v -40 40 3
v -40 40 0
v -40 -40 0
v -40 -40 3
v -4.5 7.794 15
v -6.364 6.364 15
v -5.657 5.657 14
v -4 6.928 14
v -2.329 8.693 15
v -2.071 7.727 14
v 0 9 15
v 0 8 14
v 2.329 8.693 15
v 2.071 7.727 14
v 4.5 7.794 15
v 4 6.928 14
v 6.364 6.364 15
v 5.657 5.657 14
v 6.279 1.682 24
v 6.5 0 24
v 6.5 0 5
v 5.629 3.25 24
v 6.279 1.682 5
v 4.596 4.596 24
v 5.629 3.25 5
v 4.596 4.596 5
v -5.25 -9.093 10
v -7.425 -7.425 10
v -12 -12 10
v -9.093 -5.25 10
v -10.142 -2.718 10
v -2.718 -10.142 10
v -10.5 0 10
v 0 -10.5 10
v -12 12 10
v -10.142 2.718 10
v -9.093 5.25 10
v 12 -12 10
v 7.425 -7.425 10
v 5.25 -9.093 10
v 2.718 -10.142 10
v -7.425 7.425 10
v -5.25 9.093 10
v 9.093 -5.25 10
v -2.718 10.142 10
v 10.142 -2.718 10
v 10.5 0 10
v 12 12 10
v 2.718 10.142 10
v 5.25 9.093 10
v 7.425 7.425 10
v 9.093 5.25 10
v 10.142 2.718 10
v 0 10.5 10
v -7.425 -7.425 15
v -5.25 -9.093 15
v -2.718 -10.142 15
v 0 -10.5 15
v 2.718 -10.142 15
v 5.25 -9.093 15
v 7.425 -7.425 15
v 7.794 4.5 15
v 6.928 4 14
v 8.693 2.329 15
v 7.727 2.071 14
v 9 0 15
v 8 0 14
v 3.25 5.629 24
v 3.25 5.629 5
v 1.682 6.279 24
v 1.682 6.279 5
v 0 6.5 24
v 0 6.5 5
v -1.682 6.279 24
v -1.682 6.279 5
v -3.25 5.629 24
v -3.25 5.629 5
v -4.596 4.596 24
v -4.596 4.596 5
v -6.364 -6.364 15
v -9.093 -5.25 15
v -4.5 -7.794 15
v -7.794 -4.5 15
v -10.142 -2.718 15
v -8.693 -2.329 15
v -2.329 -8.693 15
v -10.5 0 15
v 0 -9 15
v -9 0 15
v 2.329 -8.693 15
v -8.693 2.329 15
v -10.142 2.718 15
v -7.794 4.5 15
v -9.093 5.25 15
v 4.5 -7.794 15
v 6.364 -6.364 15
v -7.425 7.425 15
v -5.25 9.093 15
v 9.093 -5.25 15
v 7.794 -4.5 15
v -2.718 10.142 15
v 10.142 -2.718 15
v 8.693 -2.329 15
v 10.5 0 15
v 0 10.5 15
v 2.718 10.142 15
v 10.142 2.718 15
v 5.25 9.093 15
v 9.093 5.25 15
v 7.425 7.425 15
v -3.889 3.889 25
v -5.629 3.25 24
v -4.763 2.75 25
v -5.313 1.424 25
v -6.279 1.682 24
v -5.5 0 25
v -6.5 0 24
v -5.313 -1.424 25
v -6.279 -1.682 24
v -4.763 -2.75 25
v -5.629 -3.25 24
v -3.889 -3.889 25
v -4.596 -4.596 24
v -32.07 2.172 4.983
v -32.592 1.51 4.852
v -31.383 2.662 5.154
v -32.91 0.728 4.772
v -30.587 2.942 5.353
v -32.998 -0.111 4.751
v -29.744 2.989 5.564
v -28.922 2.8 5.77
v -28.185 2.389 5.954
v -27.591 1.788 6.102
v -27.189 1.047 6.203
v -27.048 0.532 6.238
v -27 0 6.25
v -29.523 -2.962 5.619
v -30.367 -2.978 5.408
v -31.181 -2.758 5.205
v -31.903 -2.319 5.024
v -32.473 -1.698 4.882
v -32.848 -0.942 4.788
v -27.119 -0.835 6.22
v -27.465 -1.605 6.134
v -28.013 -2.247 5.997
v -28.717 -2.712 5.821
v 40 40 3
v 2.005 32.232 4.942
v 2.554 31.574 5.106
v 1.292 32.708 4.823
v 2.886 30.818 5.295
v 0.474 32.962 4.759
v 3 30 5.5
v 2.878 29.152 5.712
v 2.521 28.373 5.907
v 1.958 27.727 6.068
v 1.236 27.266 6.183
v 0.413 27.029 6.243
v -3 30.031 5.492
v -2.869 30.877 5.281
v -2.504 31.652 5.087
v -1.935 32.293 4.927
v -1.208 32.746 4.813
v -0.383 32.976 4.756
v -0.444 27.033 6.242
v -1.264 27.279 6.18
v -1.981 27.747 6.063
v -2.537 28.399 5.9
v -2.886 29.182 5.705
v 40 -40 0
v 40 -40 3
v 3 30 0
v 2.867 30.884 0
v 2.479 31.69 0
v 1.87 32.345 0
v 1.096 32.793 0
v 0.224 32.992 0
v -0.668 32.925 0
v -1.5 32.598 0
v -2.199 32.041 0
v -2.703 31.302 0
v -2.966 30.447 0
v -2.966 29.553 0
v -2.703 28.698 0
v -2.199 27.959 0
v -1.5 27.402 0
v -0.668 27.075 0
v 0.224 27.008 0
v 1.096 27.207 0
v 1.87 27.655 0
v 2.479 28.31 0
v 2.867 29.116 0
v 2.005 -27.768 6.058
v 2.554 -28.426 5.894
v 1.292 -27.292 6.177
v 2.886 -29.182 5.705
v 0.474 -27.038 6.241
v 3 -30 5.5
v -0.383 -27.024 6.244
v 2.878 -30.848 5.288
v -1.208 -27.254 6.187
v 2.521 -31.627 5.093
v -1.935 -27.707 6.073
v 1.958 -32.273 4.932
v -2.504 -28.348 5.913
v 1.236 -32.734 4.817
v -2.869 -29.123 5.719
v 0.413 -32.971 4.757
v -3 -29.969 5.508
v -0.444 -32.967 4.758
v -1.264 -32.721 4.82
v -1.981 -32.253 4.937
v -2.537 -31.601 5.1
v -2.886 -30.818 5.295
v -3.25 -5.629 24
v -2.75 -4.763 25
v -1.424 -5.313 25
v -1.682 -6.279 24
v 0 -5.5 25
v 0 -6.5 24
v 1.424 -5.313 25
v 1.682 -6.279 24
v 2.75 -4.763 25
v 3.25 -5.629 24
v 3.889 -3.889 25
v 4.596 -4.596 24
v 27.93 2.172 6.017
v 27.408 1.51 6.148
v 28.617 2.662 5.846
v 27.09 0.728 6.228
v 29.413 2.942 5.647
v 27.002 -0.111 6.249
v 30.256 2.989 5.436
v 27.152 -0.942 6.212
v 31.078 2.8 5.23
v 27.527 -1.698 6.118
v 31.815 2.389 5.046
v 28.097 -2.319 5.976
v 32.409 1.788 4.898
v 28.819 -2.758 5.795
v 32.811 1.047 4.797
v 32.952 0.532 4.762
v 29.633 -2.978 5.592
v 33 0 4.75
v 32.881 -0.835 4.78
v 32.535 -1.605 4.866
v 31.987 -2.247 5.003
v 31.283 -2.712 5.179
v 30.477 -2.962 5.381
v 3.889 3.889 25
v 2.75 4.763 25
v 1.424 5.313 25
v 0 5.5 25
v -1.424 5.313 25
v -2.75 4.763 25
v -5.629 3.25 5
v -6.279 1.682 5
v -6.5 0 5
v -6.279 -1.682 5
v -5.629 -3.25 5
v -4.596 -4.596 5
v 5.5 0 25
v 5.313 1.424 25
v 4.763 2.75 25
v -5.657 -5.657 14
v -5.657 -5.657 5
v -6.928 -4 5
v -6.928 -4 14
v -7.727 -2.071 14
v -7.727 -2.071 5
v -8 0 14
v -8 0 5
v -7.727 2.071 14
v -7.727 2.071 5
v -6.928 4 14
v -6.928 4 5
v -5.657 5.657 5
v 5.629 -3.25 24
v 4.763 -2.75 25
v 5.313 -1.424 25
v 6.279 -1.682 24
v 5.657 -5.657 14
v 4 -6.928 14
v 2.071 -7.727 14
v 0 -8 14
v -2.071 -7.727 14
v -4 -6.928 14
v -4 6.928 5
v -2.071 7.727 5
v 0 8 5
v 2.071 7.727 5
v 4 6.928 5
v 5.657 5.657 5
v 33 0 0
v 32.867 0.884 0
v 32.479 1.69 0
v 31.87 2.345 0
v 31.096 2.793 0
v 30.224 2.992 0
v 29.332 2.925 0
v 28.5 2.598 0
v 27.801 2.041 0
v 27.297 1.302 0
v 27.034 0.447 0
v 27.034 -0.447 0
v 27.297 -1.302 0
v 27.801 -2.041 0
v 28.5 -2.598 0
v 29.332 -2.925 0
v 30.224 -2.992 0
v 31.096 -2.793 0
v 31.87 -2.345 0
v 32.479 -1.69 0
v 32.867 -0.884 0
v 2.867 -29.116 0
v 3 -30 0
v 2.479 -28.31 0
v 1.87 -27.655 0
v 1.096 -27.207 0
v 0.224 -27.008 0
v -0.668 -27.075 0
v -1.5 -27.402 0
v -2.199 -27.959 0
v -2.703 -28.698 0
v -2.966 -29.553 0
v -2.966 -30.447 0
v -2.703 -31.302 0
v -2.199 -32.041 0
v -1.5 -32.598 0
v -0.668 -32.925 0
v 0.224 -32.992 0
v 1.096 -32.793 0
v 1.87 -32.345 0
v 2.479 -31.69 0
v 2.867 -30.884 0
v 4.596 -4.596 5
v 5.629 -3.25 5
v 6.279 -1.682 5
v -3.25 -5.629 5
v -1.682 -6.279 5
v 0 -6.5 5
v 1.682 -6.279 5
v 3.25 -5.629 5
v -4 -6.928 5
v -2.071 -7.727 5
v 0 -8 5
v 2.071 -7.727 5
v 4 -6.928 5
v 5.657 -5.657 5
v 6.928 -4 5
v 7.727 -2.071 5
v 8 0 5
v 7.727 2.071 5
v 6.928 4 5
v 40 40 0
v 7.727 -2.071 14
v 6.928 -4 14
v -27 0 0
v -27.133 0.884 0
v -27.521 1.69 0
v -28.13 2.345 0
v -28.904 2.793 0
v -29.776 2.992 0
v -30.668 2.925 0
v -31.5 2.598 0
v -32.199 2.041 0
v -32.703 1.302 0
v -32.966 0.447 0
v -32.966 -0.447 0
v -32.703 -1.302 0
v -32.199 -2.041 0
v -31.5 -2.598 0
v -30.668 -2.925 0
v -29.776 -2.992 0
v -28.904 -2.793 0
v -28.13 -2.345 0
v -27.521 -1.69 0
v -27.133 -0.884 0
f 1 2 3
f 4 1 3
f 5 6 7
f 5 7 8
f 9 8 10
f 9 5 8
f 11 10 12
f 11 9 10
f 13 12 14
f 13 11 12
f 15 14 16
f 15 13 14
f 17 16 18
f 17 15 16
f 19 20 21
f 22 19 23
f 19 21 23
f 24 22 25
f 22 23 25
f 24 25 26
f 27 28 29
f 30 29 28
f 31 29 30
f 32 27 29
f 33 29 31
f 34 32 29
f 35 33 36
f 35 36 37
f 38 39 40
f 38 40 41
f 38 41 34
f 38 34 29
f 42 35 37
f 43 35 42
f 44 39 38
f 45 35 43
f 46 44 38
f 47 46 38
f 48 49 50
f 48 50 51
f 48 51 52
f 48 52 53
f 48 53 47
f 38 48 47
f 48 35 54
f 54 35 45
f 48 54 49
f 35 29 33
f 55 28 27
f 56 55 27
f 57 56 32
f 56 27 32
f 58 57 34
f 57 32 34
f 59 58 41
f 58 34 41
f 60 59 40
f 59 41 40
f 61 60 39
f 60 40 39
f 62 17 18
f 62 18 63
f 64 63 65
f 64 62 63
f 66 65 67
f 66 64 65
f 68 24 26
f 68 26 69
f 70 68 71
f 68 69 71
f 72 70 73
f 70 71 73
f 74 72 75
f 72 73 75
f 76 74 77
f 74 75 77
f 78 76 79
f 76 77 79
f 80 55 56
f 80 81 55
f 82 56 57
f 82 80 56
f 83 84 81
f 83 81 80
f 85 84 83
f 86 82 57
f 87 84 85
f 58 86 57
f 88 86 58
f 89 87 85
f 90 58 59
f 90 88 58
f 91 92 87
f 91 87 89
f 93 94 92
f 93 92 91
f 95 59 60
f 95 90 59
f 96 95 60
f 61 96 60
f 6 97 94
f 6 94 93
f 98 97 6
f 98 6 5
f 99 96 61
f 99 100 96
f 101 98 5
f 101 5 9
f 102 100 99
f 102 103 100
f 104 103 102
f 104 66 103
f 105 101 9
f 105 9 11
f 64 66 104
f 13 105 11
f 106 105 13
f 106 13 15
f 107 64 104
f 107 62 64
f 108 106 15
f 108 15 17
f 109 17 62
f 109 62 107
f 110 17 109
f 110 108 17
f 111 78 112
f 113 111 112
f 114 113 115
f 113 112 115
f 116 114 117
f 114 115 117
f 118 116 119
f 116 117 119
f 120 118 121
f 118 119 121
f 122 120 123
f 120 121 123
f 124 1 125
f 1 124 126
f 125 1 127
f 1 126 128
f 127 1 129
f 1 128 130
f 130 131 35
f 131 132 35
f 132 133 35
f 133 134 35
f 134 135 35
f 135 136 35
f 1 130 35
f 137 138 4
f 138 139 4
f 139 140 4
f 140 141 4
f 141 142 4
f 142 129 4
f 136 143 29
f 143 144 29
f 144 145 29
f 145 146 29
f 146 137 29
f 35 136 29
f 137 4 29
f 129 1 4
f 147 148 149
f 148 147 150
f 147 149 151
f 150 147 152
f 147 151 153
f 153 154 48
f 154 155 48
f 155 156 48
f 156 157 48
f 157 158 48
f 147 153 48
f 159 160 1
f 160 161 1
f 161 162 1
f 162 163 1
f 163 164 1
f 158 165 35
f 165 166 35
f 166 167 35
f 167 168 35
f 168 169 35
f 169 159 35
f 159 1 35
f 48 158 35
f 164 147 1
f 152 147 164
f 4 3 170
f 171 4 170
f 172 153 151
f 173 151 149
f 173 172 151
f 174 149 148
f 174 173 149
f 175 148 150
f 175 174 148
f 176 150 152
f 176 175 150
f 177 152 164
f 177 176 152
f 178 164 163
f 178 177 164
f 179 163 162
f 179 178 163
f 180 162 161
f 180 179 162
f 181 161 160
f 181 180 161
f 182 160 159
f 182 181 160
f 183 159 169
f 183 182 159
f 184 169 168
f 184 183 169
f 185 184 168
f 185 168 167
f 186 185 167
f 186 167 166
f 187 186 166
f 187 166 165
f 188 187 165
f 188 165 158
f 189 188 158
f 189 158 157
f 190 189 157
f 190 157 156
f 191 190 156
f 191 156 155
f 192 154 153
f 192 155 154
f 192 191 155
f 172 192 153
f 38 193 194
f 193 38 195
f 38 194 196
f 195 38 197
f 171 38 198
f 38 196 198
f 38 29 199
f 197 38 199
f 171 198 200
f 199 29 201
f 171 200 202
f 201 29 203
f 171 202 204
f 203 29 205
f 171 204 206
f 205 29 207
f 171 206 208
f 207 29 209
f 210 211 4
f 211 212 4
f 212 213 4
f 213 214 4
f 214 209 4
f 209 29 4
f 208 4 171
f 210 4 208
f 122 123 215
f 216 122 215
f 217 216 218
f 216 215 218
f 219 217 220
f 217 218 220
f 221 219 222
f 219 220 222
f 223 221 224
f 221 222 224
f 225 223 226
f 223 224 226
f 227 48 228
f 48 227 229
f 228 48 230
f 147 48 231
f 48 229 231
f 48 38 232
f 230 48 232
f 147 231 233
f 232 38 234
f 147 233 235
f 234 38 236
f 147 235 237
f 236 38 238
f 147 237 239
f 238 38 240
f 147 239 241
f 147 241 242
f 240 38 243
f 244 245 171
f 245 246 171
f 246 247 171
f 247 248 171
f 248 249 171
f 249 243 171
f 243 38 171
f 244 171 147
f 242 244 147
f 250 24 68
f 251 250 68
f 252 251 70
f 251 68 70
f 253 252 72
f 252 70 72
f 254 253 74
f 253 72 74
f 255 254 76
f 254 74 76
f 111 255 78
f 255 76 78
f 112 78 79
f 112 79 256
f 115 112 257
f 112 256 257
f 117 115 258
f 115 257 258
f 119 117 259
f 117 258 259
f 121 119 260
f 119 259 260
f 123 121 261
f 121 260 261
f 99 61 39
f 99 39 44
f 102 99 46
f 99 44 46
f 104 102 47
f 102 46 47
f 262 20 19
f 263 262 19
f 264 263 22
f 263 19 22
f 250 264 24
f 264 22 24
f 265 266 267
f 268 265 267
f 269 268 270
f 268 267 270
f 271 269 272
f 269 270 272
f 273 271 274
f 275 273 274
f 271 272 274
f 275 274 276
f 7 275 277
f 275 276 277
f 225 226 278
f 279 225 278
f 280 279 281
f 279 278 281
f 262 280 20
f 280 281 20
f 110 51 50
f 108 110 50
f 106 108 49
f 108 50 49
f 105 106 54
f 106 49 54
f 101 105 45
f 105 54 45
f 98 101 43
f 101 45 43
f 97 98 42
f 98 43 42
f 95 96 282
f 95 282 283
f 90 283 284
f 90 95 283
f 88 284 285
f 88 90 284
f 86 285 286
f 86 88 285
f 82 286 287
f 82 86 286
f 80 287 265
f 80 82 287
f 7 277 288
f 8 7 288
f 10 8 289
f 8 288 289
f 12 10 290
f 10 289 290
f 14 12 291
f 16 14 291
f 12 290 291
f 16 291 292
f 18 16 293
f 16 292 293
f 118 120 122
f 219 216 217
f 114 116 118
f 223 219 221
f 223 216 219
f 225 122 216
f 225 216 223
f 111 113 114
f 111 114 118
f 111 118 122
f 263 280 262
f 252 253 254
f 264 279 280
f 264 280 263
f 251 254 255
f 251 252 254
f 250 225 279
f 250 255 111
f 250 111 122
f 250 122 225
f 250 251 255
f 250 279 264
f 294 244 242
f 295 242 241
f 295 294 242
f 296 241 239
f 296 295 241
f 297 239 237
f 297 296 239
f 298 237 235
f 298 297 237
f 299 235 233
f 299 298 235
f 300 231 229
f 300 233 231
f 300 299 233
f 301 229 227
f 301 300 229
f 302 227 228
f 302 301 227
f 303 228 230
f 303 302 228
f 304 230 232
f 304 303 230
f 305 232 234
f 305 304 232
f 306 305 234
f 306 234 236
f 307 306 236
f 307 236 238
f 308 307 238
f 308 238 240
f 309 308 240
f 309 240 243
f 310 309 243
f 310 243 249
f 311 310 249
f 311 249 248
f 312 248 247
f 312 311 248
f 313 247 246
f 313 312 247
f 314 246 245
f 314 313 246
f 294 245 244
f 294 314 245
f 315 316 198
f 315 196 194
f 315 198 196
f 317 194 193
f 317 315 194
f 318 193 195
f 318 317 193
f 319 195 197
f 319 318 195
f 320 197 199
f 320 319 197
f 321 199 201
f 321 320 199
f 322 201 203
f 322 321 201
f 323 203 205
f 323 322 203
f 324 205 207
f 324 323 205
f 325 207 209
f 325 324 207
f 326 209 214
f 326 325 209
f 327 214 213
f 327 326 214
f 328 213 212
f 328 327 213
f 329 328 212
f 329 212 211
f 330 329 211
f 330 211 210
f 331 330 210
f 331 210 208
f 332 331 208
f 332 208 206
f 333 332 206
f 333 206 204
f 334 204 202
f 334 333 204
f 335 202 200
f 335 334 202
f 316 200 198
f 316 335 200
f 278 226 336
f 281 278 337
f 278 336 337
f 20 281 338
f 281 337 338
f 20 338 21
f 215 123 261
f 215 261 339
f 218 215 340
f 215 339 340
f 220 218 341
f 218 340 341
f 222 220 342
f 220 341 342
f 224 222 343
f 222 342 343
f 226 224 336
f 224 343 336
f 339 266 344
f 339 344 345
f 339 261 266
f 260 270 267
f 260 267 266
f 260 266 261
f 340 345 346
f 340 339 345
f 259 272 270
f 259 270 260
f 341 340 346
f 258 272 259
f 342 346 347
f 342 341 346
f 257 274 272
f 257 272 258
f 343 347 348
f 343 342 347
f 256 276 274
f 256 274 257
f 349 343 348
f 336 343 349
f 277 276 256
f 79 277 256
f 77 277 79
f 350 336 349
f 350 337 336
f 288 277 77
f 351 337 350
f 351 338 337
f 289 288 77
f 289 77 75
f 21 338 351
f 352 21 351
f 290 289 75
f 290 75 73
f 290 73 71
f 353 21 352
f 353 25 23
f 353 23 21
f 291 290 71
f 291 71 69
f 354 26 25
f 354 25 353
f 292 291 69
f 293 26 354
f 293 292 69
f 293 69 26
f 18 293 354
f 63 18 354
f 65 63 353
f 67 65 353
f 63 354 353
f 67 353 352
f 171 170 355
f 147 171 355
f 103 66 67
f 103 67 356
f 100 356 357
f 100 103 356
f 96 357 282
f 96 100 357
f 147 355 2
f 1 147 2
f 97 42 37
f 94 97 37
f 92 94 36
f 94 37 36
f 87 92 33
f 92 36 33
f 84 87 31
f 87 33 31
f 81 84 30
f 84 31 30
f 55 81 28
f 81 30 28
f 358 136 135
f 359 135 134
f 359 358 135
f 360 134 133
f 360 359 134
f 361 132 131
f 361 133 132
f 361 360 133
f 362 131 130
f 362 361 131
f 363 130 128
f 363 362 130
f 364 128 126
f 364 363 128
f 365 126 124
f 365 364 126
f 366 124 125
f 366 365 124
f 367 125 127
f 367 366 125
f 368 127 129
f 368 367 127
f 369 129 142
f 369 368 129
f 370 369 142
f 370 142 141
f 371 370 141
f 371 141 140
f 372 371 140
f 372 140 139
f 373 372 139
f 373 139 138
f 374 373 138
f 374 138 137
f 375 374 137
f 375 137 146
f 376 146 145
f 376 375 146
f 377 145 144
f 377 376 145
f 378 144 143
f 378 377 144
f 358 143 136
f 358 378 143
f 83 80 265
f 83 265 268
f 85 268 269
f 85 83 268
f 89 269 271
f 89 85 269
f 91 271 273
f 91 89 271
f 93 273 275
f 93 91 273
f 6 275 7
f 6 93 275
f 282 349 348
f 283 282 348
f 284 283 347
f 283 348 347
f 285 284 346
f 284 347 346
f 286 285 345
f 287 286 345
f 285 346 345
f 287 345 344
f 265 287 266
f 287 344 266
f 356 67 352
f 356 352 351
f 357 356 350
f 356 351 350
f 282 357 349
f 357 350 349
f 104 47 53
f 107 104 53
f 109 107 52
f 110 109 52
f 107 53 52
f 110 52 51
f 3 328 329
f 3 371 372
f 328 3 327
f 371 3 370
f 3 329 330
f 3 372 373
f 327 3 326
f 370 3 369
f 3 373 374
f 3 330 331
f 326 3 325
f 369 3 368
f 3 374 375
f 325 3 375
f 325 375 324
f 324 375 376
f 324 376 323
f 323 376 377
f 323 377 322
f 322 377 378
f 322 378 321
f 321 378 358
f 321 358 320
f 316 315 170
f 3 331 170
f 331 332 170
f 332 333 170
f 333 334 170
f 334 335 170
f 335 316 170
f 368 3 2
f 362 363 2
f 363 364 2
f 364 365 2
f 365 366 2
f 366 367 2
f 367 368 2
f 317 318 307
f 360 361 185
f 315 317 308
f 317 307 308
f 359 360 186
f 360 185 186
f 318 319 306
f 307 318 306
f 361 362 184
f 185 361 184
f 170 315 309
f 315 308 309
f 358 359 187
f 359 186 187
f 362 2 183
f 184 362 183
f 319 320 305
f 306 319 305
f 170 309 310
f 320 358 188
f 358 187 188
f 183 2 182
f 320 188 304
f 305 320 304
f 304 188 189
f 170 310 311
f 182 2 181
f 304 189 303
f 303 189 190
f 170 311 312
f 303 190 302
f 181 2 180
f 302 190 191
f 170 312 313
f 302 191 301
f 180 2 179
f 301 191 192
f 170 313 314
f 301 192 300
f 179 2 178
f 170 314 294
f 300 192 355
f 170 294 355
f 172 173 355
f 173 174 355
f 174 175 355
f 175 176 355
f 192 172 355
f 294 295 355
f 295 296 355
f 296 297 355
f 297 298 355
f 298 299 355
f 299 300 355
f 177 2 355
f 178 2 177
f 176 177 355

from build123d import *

# Parameters (mm, degrees)
F0_R     = 3
F1_DEPTH = 10
F2_DEPTH = 15
F3_DEPTH = 5
F4_DEPTH = 25
F7_DEPTH = 80
F8_DEPTH = 80
F9_SIZE  = 1


with BuildPart() as f1:
    # F0 (on Top) → F1 (new body)
    with BuildSketch(Plane.XY):
        with BuildLine():
            ThreePointArc((-7.4246212025, 7.4246212025), (0, 10.5), (7.4246212025, 7.4246212025))
            Line((7.4246212025, 7.4246212025), (40, 40))
            Line((40, 40), (-40, 40))
            Line((-40, 40), (-7.4246212025, 7.4246212025))
        make_face()
        with Locations((0, 30)):
            Circle(F0_R, mode=Mode.SUBTRACT)
        with BuildLine():
            Line((40, 40), (7.4246212025, 7.4246212025))
            ThreePointArc((7.4246212025, 7.4246212025), (9.7007350914, 4.0181760398), (10.5, 0))
            ThreePointArc((10.5, 0), (9.7007350914, -4.0181760398), (7.4246212025, -7.4246212025))
            Line((7.4246212025, -7.4246212025), (40, -40))
            Line((40, -40), (40, 40))
        make_face()
        with Locations((30, 0)):
            Circle(F0_R, mode=Mode.SUBTRACT)
        with BuildLine():
            Line((40, -40), (7.4246212025, -7.4246212025))
            ThreePointArc((7.4246212025, -7.4246212025), (0, -10.5), (-7.4246212025, -7.4246212025))
            Line((-7.4246212025, -7.4246212025), (-40, -40))
            Line((-40, -40), (40, -40))
        make_face()
        with Locations((0, -30)):
            Circle(F0_R, mode=Mode.SUBTRACT)
        with BuildLine():
            ThreePointArc((-7.4246212025, -7.4246212025), (-10.5, 0), (-7.4246212025, 7.4246212025))
            Line((-7.4246212025, 7.4246212025), (-40, 40))
            Line((-40, 40), (-40, -40))
            Line((-40, -40), (-7.4246212025, -7.4246212025))
        make_face()
        with Locations((-30, 0)):
            Circle(F0_R, mode=Mode.SUBTRACT)
    extrude(amount=F1_DEPTH)

    # F0 (on Top) → F2 (join)
    with BuildSketch(Plane.XY):
        with BuildLine():
            ThreePointArc((-5.6568542495, 5.6568542495), (0, 8), (5.6568542495, 5.6568542495))
            Line((5.6568542495, 5.6568542495), (7.4246212025, 7.4246212025))
            ThreePointArc((7.4246212025, 7.4246212025), (0, 10.5), (-7.4246212025, 7.4246212025))
            Line((-7.4246212025, 7.4246212025), (-5.6568542495, 5.6568542495))
        make_face()
        with BuildLine():
            Line((7.4246212025, 7.4246212025), (5.6568542495, 5.6568542495))
            ThreePointArc((5.6568542495, 5.6568542495), (7.3910362601, 3.0614674589), (8, 0))
            ThreePointArc((8, 0), (7.3910362601, -3.0614674589), (5.6568542495, -5.6568542495))
            Line((5.6568542495, -5.6568542495), (7.4246212025, -7.4246212025))
            ThreePointArc((7.4246212025, -7.4246212025), (9.7007350914, -4.0181760398), (10.5, 0))
            ThreePointArc((10.5, 0), (9.7007350914, 4.0181760398), (7.4246212025, 7.4246212025))
        make_face()
        with BuildLine():
            Line((7.4246212025, -7.4246212025), (5.6568542495, -5.6568542495))
            ThreePointArc((5.6568542495, -5.6568542495), (0, -8), (-5.6568542495, -5.6568542495))
            Line((-5.6568542495, -5.6568542495), (-7.4246212025, -7.4246212025))
            ThreePointArc((-7.4246212025, -7.4246212025), (0, -10.5), (7.4246212025, -7.4246212025))
        make_face()
        with BuildLine():
            ThreePointArc((-5.6568542495, -5.6568542495), (-8, 0), (-5.6568542495, 5.6568542495))
            Line((-5.6568542495, 5.6568542495), (-7.4246212025, 7.4246212025))
            ThreePointArc((-7.4246212025, 7.4246212025), (-10.5, 0), (-7.4246212025, -7.4246212025))
            Line((-7.4246212025, -7.4246212025), (-5.6568542495, -5.6568542495))
        make_face()
    extrude(amount=F2_DEPTH)

    # F0 (on Top) → F3 (join)
    with BuildSketch(Plane.XY):
        with BuildLine():
            ThreePointArc((4.5961940777, 4.5961940777), (6.0052169613, 2.4874423104), (6.5, 0))
            ThreePointArc((6.5, 0), (6.0052169613, -2.4874423104), (4.5961940777, -4.5961940777))
            Line((4.5961940777, -4.5961940777), (5.6568542495, -5.6568542495))
            ThreePointArc((5.6568542495, -5.6568542495), (7.3910362601, -3.0614674589), (8, 0))
            ThreePointArc((8, 0), (7.3910362601, 3.0614674589), (5.6568542495, 5.6568542495))
            Line((5.6568542495, 5.6568542495), (4.5961940777, 4.5961940777))
        make_face()
        with BuildLine():
            Line((5.6568542495, -5.6568542495), (4.5961940777, -4.5961940777))
            ThreePointArc((4.5961940777, -4.5961940777), (0, -6.5), (-4.5961940777, -4.5961940777))
            Line((-4.5961940777, -4.5961940777), (-5.6568542495, -5.6568542495))
            ThreePointArc((-5.6568542495, -5.6568542495), (0, -8), (5.6568542495, -5.6568542495))
        make_face()
        with BuildLine():
            ThreePointArc((-4.5961940777, 4.5961940777), (0, 6.5), (4.5961940777, 4.5961940777))
            Line((4.5961940777, 4.5961940777), (5.6568542495, 5.6568542495))
            ThreePointArc((5.6568542495, 5.6568542495), (0, 8), (-5.6568542495, 5.6568542495))
            Line((-5.6568542495, 5.6568542495), (-4.5961940777, 4.5961940777))
        make_face()
        with BuildLine():
            ThreePointArc((-4.5961940777, -4.5961940777), (-6.5, 0), (-4.5961940777, 4.5961940777))
            Line((-4.5961940777, 4.5961940777), (-5.6568542495, 5.6568542495))
            ThreePointArc((-5.6568542495, 5.6568542495), (-8, 0), (-5.6568542495, -5.6568542495))
            Line((-5.6568542495, -5.6568542495), (-4.5961940777, -4.5961940777))
        make_face()
    extrude(amount=F3_DEPTH)

    # F0 (on Top) → F4 (join)
    with BuildSketch(Plane.XY):
        with BuildLine():
            ThreePointArc((4.5961940777, -4.5961940777), (6.0052169613, -2.4874423104), (6.5, 0))
            ThreePointArc((6.5, 0), (6.0052169613, 2.4874423104), (4.5961940777, 4.5961940777))
            Line((4.5961940777, 4.5961940777), (0, 0))
            Line((0, 0), (4.5961940777, -4.5961940777))
        make_face()
        with BuildLine():
            ThreePointArc((-4.5961940777, -4.5961940777), (0, -6.5), (4.5961940777, -4.5961940777))
            Line((4.5961940777, -4.5961940777), (0, 0))
            Line((0, 0), (-4.5961940777, -4.5961940777))
        make_face()
        with BuildLine():
            Line((0, 0), (-4.5961940777, 4.5961940777))
            ThreePointArc((-4.5961940777, 4.5961940777), (-6.5, 0), (-4.5961940777, -4.5961940777))
            Line((-4.5961940777, -4.5961940777), (0, 0))
        make_face()
        with BuildLine():
            Line((0, 0), (4.5961940777, 4.5961940777))
            ThreePointArc((4.5961940777, 4.5961940777), (0, 6.5), (-4.5961940777, 4.5961940777))
            Line((-4.5961940777, 4.5961940777), (0, 0))
        make_face()
    extrude(amount=F4_DEPTH)

    # F5 (on face) → F7 (cut)
    with BuildSketch(Plane.XZ.offset(40)):
        Polygon((-40, 3), (-12, 10), (-40, 10), align=None)
        Polygon((40, 10), (12, 10), (40, 3), align=None)
    extrude(amount=-F7_DEPTH, mode=Mode.SUBTRACT)

    # F6 (on face) → F8 (cut)
    with BuildSketch(Plane(origin=(-40, 0, 0), x_dir=(0, -1, 0), z_dir=(-1, 0, 0))):
        Polygon((-40, 3), (-12, 10), (-40, 10), align=None)
        Polygon((40, 10), (12, 10), (40, 3), align=None)
    extrude(amount=-F8_DEPTH, mode=Mode.SUBTRACT)

    # F9
    f9_edges = [f1.edges().sort_by_distance(p)[0] for p in [
        (5.656854, 5.656854, 15),
        (-4.596194, -4.596194, 25),
    ]]
    chamfer(f9_edges, length=F9_SIZE)


solid = f1.part
